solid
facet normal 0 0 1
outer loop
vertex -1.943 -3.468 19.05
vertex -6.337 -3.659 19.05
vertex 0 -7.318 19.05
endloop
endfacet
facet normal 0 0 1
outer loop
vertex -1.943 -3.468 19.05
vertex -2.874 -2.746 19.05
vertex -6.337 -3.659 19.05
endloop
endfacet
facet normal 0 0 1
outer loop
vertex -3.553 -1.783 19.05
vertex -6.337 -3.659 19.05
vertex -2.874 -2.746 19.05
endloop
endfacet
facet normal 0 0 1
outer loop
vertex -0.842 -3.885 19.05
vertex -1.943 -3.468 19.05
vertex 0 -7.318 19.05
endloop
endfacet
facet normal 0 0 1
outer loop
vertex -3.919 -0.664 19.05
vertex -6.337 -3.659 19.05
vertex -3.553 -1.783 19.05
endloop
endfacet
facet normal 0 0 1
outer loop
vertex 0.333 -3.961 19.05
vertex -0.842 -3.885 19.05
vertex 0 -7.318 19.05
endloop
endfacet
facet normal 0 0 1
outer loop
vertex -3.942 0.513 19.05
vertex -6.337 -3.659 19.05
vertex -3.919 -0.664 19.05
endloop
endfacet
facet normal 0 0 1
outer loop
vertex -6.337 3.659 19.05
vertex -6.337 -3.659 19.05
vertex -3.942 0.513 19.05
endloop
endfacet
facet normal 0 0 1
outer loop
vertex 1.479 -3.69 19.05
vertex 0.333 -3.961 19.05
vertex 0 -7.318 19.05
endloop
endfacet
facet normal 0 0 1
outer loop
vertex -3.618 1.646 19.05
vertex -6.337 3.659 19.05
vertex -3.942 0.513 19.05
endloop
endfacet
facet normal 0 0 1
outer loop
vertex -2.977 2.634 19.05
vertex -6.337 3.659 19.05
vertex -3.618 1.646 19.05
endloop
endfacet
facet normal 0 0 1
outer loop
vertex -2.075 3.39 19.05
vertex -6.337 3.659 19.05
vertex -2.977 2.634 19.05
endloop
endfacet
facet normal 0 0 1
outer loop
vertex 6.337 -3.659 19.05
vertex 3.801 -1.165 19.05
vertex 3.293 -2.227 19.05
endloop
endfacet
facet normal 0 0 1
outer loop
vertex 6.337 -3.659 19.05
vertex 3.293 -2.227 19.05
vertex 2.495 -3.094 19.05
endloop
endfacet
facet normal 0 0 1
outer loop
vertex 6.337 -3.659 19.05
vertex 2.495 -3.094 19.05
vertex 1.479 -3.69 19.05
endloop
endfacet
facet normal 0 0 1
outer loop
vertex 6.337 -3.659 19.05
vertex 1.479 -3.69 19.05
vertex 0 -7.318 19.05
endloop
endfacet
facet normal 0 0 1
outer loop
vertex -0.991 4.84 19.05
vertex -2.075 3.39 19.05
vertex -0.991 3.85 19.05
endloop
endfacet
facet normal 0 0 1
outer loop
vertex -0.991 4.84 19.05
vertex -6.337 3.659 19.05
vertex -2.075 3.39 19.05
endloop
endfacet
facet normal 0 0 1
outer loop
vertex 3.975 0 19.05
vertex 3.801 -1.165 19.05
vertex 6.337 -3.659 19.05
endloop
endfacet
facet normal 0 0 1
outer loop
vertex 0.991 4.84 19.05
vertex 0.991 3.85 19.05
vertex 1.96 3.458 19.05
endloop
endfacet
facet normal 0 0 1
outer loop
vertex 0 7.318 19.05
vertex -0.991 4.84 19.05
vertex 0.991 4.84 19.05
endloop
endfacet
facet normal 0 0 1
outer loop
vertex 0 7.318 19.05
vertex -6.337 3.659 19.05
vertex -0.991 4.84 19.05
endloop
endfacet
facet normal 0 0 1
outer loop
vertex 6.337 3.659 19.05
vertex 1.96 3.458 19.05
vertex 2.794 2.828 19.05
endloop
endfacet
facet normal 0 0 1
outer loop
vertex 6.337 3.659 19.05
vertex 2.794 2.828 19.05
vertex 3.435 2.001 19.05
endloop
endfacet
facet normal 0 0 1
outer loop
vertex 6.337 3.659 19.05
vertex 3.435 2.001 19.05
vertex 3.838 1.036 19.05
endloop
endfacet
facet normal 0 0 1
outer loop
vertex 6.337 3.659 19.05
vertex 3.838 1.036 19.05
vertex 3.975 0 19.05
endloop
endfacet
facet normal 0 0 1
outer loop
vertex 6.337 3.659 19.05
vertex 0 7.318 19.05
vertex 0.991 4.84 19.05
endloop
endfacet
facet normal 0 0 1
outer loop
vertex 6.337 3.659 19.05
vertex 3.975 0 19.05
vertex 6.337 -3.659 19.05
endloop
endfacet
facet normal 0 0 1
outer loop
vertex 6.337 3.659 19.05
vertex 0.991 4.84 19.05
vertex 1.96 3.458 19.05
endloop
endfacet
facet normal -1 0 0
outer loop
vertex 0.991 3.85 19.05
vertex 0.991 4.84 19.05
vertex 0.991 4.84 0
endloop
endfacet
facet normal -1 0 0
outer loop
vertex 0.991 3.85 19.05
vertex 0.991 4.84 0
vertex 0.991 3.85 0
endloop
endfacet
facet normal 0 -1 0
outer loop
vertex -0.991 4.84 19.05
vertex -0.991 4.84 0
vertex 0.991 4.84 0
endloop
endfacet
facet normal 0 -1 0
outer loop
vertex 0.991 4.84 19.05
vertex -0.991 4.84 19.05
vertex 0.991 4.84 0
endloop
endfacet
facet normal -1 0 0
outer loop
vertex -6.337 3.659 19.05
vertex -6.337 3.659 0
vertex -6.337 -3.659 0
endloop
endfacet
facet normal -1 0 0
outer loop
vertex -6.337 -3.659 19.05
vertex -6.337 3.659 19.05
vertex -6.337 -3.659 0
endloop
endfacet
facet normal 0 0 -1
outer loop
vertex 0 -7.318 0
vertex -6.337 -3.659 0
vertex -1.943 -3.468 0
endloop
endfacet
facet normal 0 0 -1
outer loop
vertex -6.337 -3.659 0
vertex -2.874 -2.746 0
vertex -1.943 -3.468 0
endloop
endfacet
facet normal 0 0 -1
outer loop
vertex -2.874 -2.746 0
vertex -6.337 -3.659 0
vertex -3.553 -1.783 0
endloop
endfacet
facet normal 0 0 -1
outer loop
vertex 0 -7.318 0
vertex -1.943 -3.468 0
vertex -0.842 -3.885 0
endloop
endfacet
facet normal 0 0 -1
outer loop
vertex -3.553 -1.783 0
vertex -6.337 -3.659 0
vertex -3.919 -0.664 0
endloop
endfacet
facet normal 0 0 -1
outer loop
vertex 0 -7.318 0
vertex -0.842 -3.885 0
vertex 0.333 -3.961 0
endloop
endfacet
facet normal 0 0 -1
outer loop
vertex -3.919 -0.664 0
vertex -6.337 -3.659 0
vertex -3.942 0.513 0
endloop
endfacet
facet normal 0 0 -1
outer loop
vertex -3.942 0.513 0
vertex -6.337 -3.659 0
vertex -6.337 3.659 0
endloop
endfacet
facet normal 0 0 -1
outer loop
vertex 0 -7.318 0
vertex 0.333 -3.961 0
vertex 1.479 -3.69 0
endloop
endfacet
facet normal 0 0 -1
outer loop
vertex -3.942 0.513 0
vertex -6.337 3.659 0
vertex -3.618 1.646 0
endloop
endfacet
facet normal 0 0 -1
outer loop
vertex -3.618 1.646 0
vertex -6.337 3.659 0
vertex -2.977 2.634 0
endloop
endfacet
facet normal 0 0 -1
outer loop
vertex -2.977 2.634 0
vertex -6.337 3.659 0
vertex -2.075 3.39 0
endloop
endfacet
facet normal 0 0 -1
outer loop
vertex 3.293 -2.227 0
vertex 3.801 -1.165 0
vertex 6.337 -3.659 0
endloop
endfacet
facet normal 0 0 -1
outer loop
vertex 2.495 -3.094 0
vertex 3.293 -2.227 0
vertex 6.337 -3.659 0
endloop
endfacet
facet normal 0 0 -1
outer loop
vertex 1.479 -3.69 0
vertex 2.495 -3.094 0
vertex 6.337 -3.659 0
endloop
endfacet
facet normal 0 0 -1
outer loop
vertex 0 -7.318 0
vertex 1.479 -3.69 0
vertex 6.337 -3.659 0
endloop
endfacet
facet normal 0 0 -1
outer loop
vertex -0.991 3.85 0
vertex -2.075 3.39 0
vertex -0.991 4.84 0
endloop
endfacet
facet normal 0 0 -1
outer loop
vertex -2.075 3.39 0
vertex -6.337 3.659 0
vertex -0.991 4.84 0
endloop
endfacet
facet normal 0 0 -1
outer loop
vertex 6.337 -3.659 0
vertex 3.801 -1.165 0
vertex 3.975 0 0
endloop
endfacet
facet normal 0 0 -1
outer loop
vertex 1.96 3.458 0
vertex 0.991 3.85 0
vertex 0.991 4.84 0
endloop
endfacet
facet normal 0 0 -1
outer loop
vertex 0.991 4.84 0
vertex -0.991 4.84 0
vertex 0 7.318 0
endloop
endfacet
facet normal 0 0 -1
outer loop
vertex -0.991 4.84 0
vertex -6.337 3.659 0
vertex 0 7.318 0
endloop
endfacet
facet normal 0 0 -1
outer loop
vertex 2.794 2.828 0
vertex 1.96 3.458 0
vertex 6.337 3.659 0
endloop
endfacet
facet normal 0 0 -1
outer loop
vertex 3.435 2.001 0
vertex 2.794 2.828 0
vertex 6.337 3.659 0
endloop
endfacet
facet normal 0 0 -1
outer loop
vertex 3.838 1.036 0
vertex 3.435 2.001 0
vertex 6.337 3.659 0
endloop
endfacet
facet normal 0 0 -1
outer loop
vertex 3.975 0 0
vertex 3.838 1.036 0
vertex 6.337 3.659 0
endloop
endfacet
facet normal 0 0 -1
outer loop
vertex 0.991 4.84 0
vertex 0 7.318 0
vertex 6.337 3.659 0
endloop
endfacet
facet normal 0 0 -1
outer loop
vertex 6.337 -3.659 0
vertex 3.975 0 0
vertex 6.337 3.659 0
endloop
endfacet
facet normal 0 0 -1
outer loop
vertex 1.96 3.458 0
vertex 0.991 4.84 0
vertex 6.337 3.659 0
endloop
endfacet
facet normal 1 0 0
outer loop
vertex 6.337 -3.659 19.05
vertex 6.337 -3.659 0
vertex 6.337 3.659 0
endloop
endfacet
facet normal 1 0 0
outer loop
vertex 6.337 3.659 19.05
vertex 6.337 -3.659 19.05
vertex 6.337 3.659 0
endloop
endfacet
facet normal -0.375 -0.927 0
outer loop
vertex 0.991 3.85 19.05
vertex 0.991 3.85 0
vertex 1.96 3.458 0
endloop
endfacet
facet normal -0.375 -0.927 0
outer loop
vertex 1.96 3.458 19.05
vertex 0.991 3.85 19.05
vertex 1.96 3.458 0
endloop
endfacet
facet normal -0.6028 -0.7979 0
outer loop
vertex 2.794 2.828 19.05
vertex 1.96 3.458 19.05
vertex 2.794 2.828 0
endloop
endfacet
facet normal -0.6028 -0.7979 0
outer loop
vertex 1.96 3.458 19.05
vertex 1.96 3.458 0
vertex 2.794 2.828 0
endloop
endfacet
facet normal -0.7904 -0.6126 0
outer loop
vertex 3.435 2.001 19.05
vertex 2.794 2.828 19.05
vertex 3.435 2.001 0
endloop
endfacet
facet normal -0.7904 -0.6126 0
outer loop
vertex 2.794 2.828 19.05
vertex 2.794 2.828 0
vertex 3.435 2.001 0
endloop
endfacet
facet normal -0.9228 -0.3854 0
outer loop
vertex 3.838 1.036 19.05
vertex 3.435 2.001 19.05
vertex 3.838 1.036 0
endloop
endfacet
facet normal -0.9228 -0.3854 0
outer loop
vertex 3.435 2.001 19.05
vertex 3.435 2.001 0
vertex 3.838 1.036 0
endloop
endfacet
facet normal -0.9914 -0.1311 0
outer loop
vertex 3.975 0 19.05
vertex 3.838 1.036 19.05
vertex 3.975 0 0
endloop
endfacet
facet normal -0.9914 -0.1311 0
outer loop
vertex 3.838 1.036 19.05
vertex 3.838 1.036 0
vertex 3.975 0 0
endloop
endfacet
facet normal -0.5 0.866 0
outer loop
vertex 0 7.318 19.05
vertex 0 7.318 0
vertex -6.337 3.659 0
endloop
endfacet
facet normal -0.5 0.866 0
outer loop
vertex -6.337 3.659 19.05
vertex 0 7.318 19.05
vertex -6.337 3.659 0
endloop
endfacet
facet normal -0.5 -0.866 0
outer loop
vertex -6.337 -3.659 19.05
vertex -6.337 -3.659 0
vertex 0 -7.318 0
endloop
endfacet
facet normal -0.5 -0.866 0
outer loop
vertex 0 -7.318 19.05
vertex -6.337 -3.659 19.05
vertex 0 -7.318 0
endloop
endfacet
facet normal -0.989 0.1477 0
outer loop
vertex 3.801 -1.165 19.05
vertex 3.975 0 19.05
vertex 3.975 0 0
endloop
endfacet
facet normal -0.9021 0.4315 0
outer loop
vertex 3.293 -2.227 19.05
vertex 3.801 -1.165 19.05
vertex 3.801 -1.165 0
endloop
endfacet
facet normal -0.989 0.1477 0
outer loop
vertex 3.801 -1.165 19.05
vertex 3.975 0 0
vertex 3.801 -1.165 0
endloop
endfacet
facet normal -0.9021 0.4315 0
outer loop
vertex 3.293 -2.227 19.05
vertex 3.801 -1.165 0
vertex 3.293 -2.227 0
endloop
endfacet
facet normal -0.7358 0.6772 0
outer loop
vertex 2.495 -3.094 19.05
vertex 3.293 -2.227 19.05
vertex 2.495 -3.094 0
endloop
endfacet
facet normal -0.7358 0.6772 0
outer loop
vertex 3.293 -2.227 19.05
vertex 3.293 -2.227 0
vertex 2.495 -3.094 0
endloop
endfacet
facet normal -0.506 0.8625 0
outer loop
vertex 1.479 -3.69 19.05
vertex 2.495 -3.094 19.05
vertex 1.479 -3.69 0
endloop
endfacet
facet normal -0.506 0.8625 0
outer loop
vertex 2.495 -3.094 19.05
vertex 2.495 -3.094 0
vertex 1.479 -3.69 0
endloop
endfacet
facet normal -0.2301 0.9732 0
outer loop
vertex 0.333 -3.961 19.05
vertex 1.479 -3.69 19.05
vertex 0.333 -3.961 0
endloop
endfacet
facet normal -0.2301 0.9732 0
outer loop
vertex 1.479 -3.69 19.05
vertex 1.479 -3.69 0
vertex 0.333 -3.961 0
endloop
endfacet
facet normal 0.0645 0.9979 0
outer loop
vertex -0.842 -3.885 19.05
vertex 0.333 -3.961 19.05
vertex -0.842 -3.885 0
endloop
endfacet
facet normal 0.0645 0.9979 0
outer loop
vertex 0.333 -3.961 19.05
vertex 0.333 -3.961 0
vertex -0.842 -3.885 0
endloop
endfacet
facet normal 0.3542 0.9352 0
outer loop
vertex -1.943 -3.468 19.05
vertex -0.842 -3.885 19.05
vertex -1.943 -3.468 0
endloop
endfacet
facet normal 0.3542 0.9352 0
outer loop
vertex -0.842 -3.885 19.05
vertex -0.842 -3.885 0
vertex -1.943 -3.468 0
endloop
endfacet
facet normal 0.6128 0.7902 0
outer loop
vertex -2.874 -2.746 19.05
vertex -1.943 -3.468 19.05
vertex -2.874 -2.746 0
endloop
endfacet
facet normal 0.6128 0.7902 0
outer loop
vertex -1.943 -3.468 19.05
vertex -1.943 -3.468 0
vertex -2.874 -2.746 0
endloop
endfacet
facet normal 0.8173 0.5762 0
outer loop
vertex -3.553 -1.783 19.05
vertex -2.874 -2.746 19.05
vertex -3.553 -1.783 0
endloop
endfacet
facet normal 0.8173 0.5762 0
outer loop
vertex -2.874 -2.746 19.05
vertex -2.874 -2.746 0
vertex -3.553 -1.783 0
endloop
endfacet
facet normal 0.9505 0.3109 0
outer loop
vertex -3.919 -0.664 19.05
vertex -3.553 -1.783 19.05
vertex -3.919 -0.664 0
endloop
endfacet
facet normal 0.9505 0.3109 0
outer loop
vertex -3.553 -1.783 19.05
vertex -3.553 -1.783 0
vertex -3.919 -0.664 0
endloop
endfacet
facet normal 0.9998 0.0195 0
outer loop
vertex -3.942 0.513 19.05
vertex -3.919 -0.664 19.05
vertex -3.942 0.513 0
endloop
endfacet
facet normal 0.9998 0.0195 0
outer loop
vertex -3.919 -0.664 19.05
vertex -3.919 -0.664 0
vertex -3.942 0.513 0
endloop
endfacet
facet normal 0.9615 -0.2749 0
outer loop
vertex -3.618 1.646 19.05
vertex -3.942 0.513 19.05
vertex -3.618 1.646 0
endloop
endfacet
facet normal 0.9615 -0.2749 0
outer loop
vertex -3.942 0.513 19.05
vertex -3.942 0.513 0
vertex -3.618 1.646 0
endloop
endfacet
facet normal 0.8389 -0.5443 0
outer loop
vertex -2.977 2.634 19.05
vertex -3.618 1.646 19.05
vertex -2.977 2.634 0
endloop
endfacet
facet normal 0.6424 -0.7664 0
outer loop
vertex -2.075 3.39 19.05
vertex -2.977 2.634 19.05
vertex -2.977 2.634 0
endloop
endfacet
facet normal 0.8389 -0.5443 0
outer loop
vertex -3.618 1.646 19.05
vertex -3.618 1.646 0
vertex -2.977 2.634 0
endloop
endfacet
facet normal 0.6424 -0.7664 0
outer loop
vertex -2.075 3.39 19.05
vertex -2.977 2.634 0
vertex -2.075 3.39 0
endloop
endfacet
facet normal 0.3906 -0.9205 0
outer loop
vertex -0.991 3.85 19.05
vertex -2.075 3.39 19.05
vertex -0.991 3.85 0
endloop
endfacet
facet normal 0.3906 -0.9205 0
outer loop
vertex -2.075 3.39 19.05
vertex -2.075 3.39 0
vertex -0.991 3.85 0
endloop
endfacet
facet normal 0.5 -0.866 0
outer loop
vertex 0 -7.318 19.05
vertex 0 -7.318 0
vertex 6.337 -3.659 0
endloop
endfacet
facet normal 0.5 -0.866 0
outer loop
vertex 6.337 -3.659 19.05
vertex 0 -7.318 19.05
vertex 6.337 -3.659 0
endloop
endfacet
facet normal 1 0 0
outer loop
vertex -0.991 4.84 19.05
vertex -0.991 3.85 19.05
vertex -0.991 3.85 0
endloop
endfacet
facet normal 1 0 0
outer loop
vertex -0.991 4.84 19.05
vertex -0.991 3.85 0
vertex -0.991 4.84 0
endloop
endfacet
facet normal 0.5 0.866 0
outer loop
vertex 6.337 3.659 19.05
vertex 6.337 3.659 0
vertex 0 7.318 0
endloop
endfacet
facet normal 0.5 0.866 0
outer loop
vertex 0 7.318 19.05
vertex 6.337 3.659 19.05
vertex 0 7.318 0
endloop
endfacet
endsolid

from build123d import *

# Parameters (mm, degrees)
BOSS_EXTRUDE1_DEPTH = 19.05


with BuildPart() as part:
    # Sketch1 → Boss-Extrude1 (new body)
    with BuildSketch(Plane.XY):
        Polygon((6.3373, 3.658841861), (0, 7.317683722), (-6.3373, 3.658841861), (-6.3373, -3.658841861), (0, -7.317683722), (6.3373, -3.658841861), align=None)
        with BuildLine():
            ThreePointArc((3.9751, 0), (-2.435537513, -3.141588298), (-0.9906, 3.84969241))
            Line((-0.9906, 3.84969241), (-0.9906, 4.84029241))
            Line((-0.9906, 4.84029241), (0.9906, 4.84029241))
            Line((0.9906, 4.84029241), (0.9906, 3.84969241))
            ThreePointArc((0.9906, 3.84969241), (3.141588298, 2.435537513), (3.9751, 0))
        make_face(mode=Mode.SUBTRACT)
    extrude(amount=BOSS_EXTRUDE1_DEPTH)


solid = part.part
